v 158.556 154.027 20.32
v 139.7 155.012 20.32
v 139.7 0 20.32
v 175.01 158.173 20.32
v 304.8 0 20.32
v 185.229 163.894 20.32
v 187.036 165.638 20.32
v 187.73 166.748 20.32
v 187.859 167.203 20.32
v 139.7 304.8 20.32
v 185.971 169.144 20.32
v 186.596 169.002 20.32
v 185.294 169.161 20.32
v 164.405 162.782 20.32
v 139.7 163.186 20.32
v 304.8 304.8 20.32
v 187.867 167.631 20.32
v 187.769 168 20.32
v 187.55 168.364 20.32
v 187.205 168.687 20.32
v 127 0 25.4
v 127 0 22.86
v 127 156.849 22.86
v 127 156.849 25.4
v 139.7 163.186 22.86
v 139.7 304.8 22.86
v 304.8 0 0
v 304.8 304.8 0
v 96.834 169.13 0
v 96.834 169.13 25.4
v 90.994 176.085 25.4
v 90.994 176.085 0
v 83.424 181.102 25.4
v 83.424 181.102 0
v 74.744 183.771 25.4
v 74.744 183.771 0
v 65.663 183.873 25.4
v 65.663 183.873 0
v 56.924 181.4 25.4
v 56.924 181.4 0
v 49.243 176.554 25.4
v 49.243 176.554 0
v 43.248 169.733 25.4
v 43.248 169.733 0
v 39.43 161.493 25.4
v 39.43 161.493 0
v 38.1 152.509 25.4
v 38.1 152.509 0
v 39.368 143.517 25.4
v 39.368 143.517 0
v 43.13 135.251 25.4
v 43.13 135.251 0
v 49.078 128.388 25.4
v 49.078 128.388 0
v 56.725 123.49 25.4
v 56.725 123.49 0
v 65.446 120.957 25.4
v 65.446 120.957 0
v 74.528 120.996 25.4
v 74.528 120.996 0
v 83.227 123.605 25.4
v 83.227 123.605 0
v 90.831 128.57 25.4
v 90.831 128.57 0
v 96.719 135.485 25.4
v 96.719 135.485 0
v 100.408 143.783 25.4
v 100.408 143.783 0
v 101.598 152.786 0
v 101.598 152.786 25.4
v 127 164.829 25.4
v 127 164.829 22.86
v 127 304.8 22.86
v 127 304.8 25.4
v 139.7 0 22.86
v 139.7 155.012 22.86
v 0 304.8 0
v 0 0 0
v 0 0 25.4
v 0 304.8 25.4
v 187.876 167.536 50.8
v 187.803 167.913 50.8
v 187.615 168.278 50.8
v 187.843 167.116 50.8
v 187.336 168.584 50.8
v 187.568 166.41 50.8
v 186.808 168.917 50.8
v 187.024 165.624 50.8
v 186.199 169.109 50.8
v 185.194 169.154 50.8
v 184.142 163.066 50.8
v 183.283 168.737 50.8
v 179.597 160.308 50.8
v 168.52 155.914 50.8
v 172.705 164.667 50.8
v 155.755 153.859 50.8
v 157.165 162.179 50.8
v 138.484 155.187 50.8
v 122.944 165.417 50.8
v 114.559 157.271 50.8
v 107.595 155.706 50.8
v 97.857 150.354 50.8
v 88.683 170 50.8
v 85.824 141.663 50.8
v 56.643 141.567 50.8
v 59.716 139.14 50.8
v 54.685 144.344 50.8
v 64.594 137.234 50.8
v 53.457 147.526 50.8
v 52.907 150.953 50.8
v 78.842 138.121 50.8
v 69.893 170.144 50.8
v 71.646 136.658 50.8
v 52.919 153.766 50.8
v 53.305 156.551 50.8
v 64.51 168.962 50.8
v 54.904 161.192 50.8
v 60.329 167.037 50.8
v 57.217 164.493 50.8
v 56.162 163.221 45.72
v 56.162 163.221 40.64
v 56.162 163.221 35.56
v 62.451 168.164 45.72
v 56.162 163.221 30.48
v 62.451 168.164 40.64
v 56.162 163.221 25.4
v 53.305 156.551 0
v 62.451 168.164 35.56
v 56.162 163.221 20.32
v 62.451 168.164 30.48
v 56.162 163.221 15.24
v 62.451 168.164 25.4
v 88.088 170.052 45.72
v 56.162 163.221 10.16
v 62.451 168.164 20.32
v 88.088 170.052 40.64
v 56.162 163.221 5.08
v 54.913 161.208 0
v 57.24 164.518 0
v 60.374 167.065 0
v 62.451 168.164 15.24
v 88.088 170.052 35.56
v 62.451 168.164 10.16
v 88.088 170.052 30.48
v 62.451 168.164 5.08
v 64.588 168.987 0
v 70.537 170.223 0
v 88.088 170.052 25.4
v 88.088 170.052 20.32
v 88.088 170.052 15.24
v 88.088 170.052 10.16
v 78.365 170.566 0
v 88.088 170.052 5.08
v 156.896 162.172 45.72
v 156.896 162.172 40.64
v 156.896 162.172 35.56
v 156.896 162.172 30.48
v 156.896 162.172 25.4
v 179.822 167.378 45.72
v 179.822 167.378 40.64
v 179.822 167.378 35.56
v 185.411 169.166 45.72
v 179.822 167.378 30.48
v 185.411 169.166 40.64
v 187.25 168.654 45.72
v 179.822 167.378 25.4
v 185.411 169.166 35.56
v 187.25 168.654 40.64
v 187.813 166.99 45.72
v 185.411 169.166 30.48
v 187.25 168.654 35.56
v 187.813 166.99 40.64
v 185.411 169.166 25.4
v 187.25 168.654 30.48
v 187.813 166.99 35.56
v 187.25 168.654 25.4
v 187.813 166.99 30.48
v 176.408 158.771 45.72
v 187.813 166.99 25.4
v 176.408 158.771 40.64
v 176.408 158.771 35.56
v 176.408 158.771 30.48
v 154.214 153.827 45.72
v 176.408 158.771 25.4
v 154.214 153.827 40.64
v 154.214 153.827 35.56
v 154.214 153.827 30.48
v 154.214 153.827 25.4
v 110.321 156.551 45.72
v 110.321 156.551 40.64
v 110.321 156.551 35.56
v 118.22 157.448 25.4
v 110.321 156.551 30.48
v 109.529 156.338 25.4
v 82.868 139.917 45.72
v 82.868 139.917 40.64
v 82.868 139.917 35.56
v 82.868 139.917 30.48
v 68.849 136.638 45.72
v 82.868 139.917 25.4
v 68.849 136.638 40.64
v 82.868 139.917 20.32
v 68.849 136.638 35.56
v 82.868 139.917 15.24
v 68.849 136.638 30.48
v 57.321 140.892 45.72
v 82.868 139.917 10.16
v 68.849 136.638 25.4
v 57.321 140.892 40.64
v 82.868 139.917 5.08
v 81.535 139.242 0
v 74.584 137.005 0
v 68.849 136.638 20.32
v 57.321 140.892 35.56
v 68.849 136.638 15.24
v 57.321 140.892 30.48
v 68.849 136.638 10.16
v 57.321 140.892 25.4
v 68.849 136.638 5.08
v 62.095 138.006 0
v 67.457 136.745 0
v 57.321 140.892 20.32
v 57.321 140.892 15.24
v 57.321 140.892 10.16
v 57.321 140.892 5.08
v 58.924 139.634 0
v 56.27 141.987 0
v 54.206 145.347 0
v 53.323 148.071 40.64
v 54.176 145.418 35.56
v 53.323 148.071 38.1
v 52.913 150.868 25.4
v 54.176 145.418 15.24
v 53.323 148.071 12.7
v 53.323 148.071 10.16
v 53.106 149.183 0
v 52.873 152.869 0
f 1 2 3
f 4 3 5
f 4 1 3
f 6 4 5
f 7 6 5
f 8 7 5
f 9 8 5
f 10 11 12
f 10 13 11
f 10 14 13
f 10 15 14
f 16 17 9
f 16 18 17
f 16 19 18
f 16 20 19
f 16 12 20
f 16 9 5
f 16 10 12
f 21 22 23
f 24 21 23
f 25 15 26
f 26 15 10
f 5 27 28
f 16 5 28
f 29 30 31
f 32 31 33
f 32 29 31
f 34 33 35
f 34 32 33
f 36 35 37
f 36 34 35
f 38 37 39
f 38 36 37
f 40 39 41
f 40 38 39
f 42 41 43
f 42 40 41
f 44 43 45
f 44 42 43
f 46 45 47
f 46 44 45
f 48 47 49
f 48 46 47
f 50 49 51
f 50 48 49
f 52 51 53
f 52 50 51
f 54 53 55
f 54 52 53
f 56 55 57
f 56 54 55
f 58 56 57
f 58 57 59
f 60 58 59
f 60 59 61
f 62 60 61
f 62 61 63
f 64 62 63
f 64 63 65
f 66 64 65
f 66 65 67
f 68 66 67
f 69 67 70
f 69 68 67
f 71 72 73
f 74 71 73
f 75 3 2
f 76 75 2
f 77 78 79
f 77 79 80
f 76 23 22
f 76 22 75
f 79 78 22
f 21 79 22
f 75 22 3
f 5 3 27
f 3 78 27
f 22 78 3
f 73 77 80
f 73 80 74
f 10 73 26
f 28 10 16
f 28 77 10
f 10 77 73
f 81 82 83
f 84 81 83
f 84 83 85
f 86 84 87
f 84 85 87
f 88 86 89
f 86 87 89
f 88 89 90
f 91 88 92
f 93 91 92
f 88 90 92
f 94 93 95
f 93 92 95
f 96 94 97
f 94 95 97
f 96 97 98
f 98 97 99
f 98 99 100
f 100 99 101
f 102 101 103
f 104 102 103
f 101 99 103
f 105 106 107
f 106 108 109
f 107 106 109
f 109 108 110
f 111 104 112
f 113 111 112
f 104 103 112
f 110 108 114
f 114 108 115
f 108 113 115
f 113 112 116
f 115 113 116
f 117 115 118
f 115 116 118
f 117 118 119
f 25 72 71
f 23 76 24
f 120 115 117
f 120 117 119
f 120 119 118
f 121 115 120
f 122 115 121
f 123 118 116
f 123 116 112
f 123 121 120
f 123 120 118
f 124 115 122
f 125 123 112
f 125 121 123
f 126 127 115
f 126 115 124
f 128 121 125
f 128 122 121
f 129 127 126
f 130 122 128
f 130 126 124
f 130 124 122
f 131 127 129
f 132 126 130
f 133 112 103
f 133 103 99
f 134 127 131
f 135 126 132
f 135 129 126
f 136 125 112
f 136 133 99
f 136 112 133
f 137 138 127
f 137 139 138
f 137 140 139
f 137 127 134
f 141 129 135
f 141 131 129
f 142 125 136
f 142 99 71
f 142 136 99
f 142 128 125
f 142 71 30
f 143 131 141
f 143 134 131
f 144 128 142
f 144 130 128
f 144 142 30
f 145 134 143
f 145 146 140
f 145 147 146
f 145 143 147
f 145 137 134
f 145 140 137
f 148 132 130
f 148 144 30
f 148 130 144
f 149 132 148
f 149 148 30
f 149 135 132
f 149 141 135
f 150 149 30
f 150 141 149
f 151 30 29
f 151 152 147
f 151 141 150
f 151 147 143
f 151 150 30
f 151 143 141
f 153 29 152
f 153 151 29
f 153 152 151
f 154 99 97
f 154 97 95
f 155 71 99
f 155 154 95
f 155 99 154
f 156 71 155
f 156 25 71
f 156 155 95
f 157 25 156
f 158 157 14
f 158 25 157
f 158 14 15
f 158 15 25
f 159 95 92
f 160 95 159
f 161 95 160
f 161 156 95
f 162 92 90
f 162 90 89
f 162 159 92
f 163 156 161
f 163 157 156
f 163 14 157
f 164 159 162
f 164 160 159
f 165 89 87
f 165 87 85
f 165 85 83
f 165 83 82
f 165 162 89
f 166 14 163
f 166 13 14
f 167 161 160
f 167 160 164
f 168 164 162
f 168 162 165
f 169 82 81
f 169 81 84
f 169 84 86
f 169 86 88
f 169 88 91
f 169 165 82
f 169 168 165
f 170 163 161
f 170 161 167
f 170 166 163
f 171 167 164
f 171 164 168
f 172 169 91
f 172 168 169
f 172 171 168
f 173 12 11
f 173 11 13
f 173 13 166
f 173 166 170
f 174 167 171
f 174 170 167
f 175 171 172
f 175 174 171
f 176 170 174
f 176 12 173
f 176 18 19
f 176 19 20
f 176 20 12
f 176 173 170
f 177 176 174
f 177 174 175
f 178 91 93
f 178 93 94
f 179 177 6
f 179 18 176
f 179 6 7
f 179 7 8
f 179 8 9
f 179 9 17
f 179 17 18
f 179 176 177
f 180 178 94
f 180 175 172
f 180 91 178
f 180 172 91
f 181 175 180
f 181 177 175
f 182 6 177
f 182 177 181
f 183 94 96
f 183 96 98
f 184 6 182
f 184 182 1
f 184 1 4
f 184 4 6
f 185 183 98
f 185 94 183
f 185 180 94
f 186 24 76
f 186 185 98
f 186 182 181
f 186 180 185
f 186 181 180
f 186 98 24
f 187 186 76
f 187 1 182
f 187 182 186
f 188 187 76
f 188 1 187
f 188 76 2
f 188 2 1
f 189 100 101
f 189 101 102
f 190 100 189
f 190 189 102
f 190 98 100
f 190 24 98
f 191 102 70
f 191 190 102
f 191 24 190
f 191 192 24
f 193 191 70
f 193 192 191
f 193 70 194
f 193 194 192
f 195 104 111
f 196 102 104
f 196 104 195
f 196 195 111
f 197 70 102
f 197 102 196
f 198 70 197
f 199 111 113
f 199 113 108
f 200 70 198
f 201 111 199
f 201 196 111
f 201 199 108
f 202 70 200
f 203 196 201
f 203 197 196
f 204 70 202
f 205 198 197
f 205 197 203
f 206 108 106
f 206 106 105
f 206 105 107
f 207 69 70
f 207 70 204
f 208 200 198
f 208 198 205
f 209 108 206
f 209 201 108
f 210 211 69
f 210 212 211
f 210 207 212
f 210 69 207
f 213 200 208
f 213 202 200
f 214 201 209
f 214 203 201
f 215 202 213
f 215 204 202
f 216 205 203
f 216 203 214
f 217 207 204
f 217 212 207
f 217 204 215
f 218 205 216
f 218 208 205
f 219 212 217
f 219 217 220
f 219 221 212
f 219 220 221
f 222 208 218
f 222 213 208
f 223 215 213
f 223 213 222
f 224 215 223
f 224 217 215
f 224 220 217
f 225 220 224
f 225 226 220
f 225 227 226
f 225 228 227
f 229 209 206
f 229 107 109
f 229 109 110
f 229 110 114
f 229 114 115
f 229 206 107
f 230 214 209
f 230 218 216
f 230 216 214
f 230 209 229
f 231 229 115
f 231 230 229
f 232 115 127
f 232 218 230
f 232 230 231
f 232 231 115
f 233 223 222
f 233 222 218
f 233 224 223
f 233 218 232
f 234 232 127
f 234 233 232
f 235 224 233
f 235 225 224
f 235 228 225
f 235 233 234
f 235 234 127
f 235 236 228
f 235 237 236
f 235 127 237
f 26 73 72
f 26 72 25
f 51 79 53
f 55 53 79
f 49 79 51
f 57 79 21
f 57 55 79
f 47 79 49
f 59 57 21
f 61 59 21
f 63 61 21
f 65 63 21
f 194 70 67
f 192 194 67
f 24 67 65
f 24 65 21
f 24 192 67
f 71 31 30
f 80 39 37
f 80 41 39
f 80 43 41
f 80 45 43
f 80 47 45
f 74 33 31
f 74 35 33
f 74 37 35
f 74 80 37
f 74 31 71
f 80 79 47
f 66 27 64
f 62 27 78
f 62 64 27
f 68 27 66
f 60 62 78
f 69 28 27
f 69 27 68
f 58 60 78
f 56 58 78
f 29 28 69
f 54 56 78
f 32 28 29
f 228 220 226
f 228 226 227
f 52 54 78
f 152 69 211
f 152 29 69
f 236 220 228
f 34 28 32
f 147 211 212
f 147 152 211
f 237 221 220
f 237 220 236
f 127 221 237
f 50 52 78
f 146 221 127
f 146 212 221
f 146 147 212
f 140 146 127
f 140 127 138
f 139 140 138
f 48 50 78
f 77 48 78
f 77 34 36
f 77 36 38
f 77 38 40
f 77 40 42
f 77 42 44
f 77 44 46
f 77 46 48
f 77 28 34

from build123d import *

# Parameters (mm, degrees)
F0_W     = 127
F0_H     = 304.8
F0_R     = 31.75
F1_DEPTH = 25.4
F0_W_2   = 12.7
F2_DEPTH = 22.86
F0_W_3   = 165.1
F3_DEPTH = 20.32
F5_DEPTH = 50.8


with BuildPart() as f1:
    # F0 (on Top) → F1 (new body)
    with BuildSketch(Plane.XY):
        with Locations((63.5, 152.4)):
            Rectangle(F0_W, F0_H)
        with Locations((69.85, 152.4)):
            Circle(F0_R, mode=Mode.SUBTRACT)
    extrude(amount=F1_DEPTH)

    # F0 (on Top) → F2 (join)
    with BuildSketch(Plane.XY):
        with Locations((133.35, 152.4)):
            Rectangle(F0_W_2, F0_H)
    extrude(amount=F2_DEPTH)

    # F0 (on Top) → F3 (join)
    with BuildSketch(Plane.XY):
        with Locations((222.25, 152.4)):
            Rectangle(F0_W_3, F0_H)
    extrude(amount=F3_DEPTH)

    # F4 (on Top) → F5 (join)
    with BuildSketch(Plane.XY):
        with BuildLine():
            add(Edge.make_bspline(
                [(53.3054508269, 156.5510332584), (54.5673139213, 162.6849676067), (66.6874764715, 179.3115033141), (156.5282681816, 155.1984335447), (180.236948719, 168.0378421995), (186.4963693466, 169.7186284129), (190.4635359255, 165.4384503306), (156.642950558, 146.0067452755), (108.7248038019, 166.6436288048), (83.2823579893, 133.7718637026), (54.3429459776, 137.327642133), (52.1597117612, 150.9815794563), (53.3054508269, 156.5510332584)],
                knots=[0, 0, 0, 0, 0.0885461377, 0.2776787166, 0.3788760939, 0.4230700911, 0.4536662931, 0.5648269876, 0.7054343529, 0.8245132968, 0.9196023962, 1, 1, 1, 1], degree=3))
        make_face()
    extrude(amount=F5_DEPTH)


solid = f1.part
